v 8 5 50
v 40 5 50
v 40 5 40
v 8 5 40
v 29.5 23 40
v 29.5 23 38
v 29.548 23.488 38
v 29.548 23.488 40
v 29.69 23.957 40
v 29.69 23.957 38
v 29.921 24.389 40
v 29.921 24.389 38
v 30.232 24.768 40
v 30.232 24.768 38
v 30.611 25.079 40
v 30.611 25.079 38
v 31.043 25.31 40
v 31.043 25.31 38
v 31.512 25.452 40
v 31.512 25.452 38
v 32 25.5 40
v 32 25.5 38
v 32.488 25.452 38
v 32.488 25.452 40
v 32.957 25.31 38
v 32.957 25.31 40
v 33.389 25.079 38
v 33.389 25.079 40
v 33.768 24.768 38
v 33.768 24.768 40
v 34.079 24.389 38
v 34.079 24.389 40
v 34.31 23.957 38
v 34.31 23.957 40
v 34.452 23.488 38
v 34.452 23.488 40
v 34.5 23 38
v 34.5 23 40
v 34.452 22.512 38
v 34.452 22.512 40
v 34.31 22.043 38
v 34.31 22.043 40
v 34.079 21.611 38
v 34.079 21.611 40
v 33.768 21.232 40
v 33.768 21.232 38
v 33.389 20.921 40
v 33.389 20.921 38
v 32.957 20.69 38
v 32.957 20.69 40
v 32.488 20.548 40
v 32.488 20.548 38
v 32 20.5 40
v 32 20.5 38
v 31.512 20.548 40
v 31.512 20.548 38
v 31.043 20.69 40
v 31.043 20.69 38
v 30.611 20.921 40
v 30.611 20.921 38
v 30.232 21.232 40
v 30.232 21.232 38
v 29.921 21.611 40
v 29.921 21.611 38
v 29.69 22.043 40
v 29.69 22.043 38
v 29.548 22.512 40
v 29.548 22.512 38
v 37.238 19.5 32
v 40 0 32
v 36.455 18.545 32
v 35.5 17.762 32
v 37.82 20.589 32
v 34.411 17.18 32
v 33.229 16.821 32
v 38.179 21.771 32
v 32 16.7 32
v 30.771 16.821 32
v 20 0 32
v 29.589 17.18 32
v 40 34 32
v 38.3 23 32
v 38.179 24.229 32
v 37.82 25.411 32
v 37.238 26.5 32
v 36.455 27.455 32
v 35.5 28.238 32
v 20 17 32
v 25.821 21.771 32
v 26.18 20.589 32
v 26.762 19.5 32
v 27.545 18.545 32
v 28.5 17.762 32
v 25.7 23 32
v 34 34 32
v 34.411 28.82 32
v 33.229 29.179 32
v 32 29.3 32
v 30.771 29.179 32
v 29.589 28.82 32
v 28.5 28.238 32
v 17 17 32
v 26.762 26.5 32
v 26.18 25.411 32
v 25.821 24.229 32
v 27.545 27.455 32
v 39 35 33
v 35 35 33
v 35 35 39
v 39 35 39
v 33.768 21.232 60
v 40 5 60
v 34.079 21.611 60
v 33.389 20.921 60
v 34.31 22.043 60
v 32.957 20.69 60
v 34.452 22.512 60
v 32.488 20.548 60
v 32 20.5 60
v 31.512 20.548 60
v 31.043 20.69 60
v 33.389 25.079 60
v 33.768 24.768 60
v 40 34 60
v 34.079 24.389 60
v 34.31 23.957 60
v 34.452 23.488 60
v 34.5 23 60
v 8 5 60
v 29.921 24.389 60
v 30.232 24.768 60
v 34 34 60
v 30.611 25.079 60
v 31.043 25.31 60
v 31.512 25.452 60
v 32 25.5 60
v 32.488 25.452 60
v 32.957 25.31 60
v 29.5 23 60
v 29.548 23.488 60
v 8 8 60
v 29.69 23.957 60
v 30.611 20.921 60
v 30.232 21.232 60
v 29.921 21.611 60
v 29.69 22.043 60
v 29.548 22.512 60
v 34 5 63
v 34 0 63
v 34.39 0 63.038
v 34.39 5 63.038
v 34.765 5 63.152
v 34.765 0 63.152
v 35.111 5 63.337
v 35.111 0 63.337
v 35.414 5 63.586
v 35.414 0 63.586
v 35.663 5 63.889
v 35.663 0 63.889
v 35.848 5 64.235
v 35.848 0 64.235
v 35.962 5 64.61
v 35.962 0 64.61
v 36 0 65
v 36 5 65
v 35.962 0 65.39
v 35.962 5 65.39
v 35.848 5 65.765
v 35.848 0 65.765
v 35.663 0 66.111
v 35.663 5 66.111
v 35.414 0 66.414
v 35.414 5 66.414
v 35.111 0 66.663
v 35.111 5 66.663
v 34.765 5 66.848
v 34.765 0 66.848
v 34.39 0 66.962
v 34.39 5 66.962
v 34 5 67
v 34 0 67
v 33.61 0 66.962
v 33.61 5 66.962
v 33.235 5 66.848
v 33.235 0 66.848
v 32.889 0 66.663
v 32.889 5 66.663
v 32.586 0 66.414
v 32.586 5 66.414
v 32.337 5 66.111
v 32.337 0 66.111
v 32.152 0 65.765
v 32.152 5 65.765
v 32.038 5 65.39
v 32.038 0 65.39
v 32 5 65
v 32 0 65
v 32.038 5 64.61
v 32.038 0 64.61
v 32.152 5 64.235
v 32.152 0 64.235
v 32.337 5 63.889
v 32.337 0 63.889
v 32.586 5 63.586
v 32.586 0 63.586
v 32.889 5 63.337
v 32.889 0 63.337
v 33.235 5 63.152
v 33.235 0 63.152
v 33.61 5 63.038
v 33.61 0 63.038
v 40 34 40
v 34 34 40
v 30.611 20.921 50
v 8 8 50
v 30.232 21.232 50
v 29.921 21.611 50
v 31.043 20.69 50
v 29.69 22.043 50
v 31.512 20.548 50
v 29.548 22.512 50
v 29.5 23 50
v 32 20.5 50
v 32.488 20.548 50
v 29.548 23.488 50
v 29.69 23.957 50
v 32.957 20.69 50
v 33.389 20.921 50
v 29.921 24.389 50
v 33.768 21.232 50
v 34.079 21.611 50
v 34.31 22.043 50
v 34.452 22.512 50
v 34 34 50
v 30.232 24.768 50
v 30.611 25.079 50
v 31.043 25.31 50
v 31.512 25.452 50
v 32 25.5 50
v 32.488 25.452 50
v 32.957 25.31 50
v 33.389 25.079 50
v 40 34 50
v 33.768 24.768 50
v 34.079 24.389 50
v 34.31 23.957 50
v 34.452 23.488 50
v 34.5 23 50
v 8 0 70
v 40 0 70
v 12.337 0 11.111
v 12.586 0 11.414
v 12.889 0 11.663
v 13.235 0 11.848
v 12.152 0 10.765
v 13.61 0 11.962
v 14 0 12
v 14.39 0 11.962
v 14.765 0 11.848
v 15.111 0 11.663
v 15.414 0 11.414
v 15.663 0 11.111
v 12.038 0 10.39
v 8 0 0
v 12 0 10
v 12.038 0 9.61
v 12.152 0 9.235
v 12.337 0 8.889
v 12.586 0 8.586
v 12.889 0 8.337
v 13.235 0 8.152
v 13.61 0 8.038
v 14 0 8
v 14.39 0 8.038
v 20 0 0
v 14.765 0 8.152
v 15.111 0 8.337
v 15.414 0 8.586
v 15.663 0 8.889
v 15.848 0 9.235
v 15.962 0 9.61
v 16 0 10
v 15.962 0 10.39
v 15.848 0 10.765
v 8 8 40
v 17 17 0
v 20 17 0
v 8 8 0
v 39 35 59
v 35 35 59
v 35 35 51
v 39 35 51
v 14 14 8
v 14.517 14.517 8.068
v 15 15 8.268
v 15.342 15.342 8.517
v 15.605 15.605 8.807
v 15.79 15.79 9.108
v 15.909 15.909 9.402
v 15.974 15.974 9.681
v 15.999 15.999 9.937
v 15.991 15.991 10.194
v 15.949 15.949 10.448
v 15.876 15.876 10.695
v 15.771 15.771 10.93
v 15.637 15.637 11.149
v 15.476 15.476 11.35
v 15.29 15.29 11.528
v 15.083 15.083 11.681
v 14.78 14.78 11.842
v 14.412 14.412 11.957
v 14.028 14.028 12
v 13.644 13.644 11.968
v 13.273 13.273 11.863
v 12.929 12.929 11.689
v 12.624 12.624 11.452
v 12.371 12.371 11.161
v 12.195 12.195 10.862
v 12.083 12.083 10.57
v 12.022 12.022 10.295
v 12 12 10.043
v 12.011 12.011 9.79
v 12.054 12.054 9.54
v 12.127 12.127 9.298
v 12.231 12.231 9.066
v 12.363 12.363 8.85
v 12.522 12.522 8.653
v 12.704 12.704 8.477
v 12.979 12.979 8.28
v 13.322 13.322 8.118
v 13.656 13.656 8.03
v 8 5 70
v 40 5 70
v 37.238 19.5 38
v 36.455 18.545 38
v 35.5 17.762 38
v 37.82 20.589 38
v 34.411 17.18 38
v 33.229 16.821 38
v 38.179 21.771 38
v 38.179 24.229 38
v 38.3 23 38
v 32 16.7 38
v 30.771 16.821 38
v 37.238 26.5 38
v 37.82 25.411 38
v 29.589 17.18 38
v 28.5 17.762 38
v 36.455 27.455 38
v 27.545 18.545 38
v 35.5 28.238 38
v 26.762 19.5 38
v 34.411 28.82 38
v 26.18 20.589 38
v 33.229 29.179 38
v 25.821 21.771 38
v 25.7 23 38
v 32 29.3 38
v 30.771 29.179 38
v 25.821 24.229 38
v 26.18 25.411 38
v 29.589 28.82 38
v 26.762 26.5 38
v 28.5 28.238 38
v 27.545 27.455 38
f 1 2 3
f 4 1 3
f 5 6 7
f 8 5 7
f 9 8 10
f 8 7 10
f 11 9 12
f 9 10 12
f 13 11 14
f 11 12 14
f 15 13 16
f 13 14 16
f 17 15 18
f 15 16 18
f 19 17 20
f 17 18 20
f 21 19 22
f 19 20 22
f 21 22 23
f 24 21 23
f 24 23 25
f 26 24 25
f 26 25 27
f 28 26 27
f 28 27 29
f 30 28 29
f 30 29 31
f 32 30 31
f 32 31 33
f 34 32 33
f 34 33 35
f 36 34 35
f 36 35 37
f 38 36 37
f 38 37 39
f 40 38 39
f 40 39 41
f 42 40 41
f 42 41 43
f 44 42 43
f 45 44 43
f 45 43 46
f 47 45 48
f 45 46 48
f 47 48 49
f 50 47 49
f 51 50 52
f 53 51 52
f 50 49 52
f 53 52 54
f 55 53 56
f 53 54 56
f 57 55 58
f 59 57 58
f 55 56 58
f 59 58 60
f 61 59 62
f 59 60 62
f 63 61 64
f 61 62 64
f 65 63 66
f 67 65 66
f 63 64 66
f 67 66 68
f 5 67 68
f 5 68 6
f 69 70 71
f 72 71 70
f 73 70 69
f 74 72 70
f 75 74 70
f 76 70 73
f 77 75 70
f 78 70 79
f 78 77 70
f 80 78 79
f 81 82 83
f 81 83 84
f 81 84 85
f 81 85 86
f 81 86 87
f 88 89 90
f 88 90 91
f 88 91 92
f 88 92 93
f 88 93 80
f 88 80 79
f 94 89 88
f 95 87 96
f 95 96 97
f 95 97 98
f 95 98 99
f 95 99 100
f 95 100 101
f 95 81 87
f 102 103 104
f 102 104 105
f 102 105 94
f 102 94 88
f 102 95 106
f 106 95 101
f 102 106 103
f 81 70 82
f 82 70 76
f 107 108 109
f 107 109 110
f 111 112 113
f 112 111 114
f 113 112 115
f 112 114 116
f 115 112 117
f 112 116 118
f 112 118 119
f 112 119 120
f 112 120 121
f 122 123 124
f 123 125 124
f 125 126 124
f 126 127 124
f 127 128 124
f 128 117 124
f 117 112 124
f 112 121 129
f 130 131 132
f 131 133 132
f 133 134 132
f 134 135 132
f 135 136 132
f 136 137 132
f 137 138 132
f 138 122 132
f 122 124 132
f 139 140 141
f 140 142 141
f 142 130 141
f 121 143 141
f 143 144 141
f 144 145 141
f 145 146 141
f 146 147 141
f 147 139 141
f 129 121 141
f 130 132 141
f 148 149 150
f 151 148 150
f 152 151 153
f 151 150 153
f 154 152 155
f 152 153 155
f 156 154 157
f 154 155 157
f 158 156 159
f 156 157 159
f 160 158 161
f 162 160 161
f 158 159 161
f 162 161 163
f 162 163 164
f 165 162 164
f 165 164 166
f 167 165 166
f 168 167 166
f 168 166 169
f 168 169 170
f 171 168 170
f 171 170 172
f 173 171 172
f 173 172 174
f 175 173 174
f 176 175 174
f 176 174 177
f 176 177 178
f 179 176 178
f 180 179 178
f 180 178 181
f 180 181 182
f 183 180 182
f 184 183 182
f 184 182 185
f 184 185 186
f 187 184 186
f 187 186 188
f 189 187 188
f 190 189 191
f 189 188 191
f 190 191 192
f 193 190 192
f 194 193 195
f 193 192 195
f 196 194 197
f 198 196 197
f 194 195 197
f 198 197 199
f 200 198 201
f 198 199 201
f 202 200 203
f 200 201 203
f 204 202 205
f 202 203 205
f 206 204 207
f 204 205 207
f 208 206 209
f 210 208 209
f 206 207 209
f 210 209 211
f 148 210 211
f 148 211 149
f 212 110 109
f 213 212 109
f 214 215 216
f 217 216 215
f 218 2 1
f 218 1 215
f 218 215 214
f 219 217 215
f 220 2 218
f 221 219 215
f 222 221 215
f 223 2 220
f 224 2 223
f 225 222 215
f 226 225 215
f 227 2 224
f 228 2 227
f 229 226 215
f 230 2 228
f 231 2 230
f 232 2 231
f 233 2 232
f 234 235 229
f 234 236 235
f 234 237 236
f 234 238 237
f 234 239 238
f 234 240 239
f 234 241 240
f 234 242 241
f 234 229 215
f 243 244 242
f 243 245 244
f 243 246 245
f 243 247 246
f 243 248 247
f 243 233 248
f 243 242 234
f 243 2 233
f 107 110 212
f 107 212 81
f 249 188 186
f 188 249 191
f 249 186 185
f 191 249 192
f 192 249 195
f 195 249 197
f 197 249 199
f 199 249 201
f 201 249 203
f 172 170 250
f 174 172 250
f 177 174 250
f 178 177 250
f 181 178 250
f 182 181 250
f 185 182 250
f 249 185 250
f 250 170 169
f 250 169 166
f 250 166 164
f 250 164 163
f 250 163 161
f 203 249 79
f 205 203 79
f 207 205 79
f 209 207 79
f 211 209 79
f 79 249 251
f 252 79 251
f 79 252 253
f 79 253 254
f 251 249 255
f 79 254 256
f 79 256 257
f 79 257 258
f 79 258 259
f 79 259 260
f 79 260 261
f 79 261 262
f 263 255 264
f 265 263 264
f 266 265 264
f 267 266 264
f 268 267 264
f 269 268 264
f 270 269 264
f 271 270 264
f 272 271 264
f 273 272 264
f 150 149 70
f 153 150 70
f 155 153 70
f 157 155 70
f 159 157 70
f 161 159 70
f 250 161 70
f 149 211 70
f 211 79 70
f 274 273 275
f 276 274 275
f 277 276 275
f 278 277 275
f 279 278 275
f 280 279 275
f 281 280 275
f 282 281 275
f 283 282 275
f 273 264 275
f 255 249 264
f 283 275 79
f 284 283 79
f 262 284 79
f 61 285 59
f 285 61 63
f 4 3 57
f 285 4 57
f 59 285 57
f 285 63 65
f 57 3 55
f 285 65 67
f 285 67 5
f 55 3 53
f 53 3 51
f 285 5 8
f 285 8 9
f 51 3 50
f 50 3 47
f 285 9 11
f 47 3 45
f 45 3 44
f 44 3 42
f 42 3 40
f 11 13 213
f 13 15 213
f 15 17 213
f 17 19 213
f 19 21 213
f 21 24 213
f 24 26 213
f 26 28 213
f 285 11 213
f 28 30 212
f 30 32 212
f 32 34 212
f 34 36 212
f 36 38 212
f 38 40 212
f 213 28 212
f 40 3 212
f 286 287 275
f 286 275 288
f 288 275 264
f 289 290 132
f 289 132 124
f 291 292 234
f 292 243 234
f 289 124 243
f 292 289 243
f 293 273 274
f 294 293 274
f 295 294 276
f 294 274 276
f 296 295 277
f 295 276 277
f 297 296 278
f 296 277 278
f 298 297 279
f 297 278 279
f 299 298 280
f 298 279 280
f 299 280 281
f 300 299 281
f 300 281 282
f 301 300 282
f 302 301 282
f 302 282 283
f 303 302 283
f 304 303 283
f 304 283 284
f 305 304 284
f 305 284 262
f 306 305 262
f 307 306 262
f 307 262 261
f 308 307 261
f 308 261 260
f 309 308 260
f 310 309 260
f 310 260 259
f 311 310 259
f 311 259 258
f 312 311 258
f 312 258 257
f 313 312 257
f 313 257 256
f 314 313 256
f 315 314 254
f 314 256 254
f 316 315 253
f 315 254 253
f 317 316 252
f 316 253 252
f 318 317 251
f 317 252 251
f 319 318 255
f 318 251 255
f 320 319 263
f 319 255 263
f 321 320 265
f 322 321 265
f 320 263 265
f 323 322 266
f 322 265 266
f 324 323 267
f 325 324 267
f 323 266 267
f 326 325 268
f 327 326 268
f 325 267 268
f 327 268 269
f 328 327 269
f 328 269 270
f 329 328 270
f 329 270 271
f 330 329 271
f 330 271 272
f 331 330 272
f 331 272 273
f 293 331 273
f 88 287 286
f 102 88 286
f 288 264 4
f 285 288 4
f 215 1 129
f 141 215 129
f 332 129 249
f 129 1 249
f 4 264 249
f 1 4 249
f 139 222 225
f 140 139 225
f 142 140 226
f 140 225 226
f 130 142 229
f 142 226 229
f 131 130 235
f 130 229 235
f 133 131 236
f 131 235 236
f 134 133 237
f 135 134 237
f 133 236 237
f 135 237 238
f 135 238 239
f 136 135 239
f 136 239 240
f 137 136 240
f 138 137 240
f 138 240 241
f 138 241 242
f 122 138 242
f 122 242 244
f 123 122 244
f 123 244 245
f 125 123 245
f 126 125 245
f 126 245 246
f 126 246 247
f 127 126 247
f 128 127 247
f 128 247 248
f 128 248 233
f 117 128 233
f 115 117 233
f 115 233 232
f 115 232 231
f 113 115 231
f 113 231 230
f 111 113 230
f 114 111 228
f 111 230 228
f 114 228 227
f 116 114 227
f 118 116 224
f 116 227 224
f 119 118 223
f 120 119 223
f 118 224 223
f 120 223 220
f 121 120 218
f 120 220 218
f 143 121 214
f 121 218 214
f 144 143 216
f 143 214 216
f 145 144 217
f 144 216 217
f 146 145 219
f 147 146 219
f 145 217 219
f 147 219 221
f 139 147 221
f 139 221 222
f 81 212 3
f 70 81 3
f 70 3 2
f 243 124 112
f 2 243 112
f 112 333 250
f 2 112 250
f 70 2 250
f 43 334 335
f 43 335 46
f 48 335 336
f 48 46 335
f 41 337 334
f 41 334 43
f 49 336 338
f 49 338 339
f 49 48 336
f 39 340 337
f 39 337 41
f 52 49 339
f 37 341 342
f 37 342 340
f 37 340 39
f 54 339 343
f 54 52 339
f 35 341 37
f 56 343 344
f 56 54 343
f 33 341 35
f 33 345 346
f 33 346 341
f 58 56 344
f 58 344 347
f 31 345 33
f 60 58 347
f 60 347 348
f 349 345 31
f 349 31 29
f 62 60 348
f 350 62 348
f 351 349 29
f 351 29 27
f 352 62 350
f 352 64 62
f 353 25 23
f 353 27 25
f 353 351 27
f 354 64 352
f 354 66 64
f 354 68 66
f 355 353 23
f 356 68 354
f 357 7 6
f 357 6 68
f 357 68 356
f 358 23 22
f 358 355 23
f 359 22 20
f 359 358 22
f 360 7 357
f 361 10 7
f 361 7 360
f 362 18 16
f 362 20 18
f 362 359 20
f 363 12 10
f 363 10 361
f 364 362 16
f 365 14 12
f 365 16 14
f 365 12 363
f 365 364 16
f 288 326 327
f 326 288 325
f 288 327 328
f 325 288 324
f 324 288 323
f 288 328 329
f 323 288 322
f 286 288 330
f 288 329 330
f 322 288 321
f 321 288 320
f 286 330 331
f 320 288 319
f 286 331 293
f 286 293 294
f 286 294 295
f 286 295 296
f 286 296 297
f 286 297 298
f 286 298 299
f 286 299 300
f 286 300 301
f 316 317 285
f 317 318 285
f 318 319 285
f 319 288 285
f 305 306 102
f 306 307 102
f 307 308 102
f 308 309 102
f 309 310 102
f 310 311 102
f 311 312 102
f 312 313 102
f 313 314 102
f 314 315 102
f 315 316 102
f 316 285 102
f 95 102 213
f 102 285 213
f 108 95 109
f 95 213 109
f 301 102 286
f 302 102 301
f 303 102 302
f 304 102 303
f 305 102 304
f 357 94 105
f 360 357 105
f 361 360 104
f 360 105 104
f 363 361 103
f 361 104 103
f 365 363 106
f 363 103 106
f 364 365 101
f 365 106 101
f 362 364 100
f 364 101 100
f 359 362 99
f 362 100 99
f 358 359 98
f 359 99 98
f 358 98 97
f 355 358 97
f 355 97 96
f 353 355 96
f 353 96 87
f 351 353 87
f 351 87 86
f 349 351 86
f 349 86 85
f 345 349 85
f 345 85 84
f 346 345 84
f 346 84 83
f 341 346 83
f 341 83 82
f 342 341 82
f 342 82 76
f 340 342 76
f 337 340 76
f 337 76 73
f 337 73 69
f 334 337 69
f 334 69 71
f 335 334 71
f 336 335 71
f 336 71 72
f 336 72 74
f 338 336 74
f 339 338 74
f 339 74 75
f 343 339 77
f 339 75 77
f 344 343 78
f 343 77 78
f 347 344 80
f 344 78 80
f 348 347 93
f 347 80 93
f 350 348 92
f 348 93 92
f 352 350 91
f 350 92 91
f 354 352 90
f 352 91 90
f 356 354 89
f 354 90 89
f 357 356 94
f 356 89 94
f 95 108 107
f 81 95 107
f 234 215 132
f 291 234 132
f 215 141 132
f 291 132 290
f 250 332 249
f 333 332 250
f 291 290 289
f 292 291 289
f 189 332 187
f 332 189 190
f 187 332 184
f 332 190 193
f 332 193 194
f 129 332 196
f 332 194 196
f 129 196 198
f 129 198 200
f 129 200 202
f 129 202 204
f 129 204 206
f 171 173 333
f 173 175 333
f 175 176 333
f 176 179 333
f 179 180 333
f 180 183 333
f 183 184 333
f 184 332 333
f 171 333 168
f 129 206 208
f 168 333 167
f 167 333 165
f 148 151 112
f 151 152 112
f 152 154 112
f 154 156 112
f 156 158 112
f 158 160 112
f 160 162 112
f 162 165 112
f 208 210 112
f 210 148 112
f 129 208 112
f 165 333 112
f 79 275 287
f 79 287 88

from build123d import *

# Parameters (mm, degrees)
EXTRUDE_1_DEPTH      = 70
SKETCH_3_W           = 10
SKETCH_3_H           = 30
CUT_EXTRUDE_2_DEPTH  = 92.104335791
CUT_EXTRUDE_3_DEPTH  = 87.02325267
SKETCH_5_W           = 10
SKETCH_5_H           = 25
CUT_EXTRUDE_4_DEPTH  = 83.607505712
SKETCH_8_W           = 32
SKETCH_8_H           = 25
CUT_EXTRUDE_5_DEPTH  = 27
CUT_EXTRUDE_6_DEPTH  = 81.802227692
SKETCH_10_R          = 6.3
CUT_EXTRUDE_7_DEPTH  = 6
SKETCH_11_R          = 2.5
CUT_EXTRUDE_8_DEPTH  = 63.801273872
SKETCH_12_R          = 2
CUT_EXTRUDE_9_DEPTH  = 87.02325267
CUT_EXTRUDE_10_REACH = 88.023
SKETCH_13_R          = 2
CUT_EXTRUDE_11_DEPTH = 10
SKETCH_15_W          = 12
SKETCH_15_H          = 32
EXTRUDE_2_DEPTH      = 20
CUT_EXTRUDE_12_DEPTH = 63.801273872
CUT_EXTRUDE_13_DEPTH = 32
SKETCH_18_W          = 20
SKETCH_18_H          = 32
CUT_EXTRUDE_14_DEPTH = 85.409715081
EXTRUDE_3_DEPTH      = 28
SKETCH_21_W          = 10
SKETCH_21_H          = 5
CUT_EXTRUDE_15_DEPTH = 85.551759296
CHAMFER_1_SIZE       = 1
CHAMFER_2_SIZE       = 1
SKETCH_22_R          = 2
CUT_EXTRUDE_16_DEPTH = 20


with BuildPart() as part:
    # 草图1 → 拉伸1 (new body)
    with BuildSketch(Plane.XY):
        Polygon((0, 0), (50, 0), (50, 30), (30, 30), align=None)
    extrude(amount=EXTRUDE_1_DEPTH)

    # 草图3 → 切除-拉伸2 (cut, through all)
    with BuildSketch(Plane.XY.offset(70)):
        with Locations((45, 15)):
            Rectangle(SKETCH_3_W, SKETCH_3_H)
    extrude(amount=-CUT_EXTRUDE_2_DEPTH, mode=Mode.SUBTRACT)

    # 草图4 → 切除-拉伸3 (cut, through all)
    with BuildSketch(Plane.XY.offset(70)):
        Polygon((0, 0), (8, 8), (8, 0), align=None)
    extrude(amount=-CUT_EXTRUDE_3_DEPTH, mode=Mode.SUBTRACT)

    # 草图5 → 切除-拉伸4 (cut, through all)
    with BuildSketch(Plane(origin=(40, 0, 0), x_dir=(0, 0, -1), z_dir=(1, 0, 0))):
        with Locations((-65, 17.5)):
            Rectangle(SKETCH_5_W, SKETCH_5_H)
        with Locations((-45, 17.5)):
            Rectangle(SKETCH_5_W, SKETCH_5_H)
    extrude(amount=-CUT_EXTRUDE_4_DEPTH, mode=Mode.SUBTRACT)

    # 草图8 → 切除-拉伸5 (cut)
    with BuildSketch(Plane.ZY.offset(-8)):
        with Locations((16, 17.5)):
            Rectangle(SKETCH_8_W, SKETCH_8_H)
    extrude(amount=-CUT_EXTRUDE_5_DEPTH, mode=Mode.SUBTRACT)

    # 草图9 → 切除-拉伸6 (cut, through all)
    with BuildSketch(Plane.ZY.offset(-35)):
        Polygon((0, 30), (32, 30), (0, 5), align=None)
    extrude(amount=-CUT_EXTRUDE_6_DEPTH, mode=Mode.SUBTRACT)

    # 草图10 → 切除-拉伸7 (cut)
    with BuildSketch(Plane(origin=(0, 0, 32), x_dir=(-1, 0, 0), z_dir=(0, 0, -1))):
        with Locations((-32, 23)):
            Circle(SKETCH_10_R)
    extrude(amount=-CUT_EXTRUDE_7_DEPTH, mode=Mode.SUBTRACT)

    # 草图11 → 切除-拉伸8 (cut, through all)
    with BuildSketch(Plane(origin=(0, 0, 38), x_dir=(-1, 0, 0), z_dir=(0, 0, -1))):
        with Locations((-32, 23)):
            Circle(SKETCH_11_R)
    extrude(amount=-CUT_EXTRUDE_8_DEPTH, mode=Mode.SUBTRACT)

    # 草图12 → 切除-拉伸9 (cut, through all)
    with BuildSketch(Plane.XZ):
        with Locations(Location((14, 10, 0), (0, 0, 270))):
            Circle(SKETCH_12_R)
    extrude(amount=-CUT_EXTRUDE_9_DEPTH, mode=Mode.SUBTRACT)

    # 草图13 → 切除-拉伸10 (cut, up to next)
    with BuildSketch(Plane.XZ, mode=Mode.PRIVATE) as cut_extrude_10_sk1:
        with Locations(Location((34, 65, 0), (0, 0, 270))):
            Circle(SKETCH_13_R)
    cut_extrude_10_tool1 = extrude(cut_extrude_10_sk1.sketch, amount=-CUT_EXTRUDE_10_REACH, mode=Mode.PRIVATE) & part.part
    add(cut_extrude_10_tool1.solids().sort_by_distance((34, 0, 65))[0], mode=Mode.SUBTRACT)

    # 草图14 → 切除-拉伸11 (cut)
    with BuildSketch(Plane.ZY.offset(-35)):
        Polygon((32, 30), (32, 5), (0, 5), align=None)
    extrude(amount=-CUT_EXTRUDE_11_DEPTH, mode=Mode.SUBTRACT)

    # 草图15 → 拉伸2 (add)
    with BuildSketch(Plane(origin=(0, 5, 0), x_dir=(-1, 0, 0), z_dir=(0, 1, 0))):
        with Locations((-14, 16)):
            Rectangle(SKETCH_15_W, SKETCH_15_H)
    extrude(amount=EXTRUDE_2_DEPTH)

    # 草图16 → 切除-拉伸12 (cut, through all)
    with BuildSketch(Plane.XY.offset(32)):
        Polygon((20, 25), (20, 20), (8, 8), (8, 25), align=None)
    extrude(amount=-CUT_EXTRUDE_12_DEPTH, mode=Mode.SUBTRACT)

    # 草图17 → 切除-拉伸13 (cut)
    with BuildSketch(Plane(origin=(0, 0, 0), x_dir=(-1, 0, 0), z_dir=(0, 0, -1))):
        Polygon((-20, 20), (-20, 17), (-17, 17), align=None)
    extrude(amount=-CUT_EXTRUDE_13_DEPTH, mode=Mode.SUBTRACT)

    # 草图18 → 切除-拉伸14 (cut, through all)
    with BuildSketch(Plane(origin=(0, 5, 0), x_dir=(-1, 0, 0), z_dir=(0, 1, 0))):
        with Locations((-30, 16)):
            Rectangle(SKETCH_18_W, SKETCH_18_H)
    extrude(amount=-CUT_EXTRUDE_14_DEPTH, mode=Mode.SUBTRACT)

    # 草图20 → 拉伸3 (add)
    with BuildSketch(Plane.XY.offset(60)):
        Polygon((30, 30), (35, 35), (40, 35), (40, 30), align=None)
    extrude(amount=-EXTRUDE_3_DEPTH)

    # 草图21 → 切除-拉伸15 (cut, through all)
    with BuildSketch(Plane(origin=(40, 0, 0), x_dir=(0, 0, -1), z_dir=(1, 0, 0))):
        with Locations((-45, 32.5)):
            Rectangle(SKETCH_21_W, SKETCH_21_H)
    extrude(amount=-CUT_EXTRUDE_15_DEPTH, mode=Mode.SUBTRACT)

    # 倒角1
    chamfer_1_edges = [part.edges().sort_by_distance(p)[0] for p in [
        (37.5, 35, 60),
        (37.5, 35, 32),
        (37.5, 35, 40),
        (37.5, 35, 50),
    ]]
    chamfer(chamfer_1_edges, length=CHAMFER_1_SIZE)

    # 倒角2
    chamfer_2_edges = [part.edges().sort_by_distance(p)[0] for p in [
        (40, 35, 36),
        (40, 35, 55),
    ]]
    chamfer(chamfer_2_edges, length=CHAMFER_2_SIZE)

    # 草图22 → 切除-拉伸16 (cut)
    with BuildSketch(Plane.XZ.offset(-5)):
        with Locations(Location((14, 10, 0), (0, 0, 270))):
            Circle(SKETCH_22_R)
    extrude(amount=-CUT_EXTRUDE_16_DEPTH, mode=Mode.SUBTRACT)


solid = part.part
